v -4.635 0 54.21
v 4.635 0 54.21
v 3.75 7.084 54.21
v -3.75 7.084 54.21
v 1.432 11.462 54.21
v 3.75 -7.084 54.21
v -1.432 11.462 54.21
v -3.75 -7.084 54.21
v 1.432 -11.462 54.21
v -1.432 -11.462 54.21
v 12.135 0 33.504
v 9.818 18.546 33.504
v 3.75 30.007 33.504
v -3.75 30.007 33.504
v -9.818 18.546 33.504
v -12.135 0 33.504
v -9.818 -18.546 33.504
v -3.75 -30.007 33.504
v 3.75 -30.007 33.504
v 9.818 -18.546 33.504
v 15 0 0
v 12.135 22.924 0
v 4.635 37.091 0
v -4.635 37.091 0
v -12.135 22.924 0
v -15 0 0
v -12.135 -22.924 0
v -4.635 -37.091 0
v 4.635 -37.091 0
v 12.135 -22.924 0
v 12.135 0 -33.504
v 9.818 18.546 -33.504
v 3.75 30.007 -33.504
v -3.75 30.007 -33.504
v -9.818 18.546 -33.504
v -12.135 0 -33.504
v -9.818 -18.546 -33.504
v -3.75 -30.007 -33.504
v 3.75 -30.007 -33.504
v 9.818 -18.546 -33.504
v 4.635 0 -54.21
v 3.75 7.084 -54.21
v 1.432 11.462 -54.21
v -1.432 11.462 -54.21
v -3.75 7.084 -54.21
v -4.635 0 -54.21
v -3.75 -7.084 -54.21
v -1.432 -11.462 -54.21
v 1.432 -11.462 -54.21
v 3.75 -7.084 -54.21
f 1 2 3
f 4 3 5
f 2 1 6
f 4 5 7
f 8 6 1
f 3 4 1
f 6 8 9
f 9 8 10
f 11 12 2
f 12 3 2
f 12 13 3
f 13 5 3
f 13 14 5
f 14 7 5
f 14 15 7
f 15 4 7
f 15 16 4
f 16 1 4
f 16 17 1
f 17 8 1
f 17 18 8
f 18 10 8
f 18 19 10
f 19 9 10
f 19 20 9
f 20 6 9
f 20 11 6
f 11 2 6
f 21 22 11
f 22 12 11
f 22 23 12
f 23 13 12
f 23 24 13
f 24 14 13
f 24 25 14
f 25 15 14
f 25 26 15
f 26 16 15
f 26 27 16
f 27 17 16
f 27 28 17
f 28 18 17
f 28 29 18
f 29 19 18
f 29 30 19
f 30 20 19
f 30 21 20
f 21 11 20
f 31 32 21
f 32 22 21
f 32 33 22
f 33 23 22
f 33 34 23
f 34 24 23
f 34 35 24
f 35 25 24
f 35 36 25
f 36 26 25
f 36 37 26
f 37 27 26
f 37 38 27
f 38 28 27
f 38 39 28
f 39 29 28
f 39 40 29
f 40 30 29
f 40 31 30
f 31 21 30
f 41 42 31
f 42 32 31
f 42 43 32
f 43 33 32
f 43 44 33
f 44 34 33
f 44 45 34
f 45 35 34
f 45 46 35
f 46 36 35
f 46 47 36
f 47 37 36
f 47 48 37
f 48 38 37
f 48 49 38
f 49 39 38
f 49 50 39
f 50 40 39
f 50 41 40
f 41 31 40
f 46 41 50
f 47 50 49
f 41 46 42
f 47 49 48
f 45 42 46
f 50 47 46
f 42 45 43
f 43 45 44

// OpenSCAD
// Generated by SolidPython 1.0.1 on 2020-07-29 00:46:46


scale(v = [5, 13, 19]) {
	sphere(r = 3);
}
/***********************************************
*********      SolidPython code:      **********
************************************************
 
# import packages: SolidPython
from solid import *
from solid.utils import *
from itertools import chain, combinations, permutations


class Resize:

    def __init__(self, scad_file):
        self.scad_file = scad_file
        #self.scad_file = import_scad(scad_file)
        # cone/cylinder param:
        self.r1 = 0
        self.r2 = 0
        self.h = 0
        # rectangular prism param:
        self.w = 0
        self.l = 0
        # ellipse param:
        self.r = 0

    # import OpenScad code (file name corresponds to shape)


    # classify shape + parameters
    def assign(self, param1, param2, param3):
        if self.scad_file == 'cone.scad':
            self.r1 = param1
            self.r2 = param2
            self.h = param3
        elif self.scad_file == 'cylinder.scad':
            self.r1 = param1
            self.r2 = param2
            self.h = param3
        elif self.scad_file == 'rectangularPrism.scad':
            self.h = param1
            self.l = param2
            self.w = param3
        else:
            self.r = param1
            self.h = param2

    # resize parameters
    def iterate(self):
        x = range(3, 20, 2)
        i = 1
        if self.scad_file == 'cone.scad':
            tempList = list(permutations(x, 2))
            for temp in tempList:
                param1 = temp[0]
                param2 = temp[1]
                filepath = 'produced_scad_files/' + 'cone' + str(param1) + '_' + str(param2) + '_' + '.scad'
                scad_render_to_file(cylinder(h=param1, r1=param2, r2=0), filepath)

        elif self.scad_file == 'cylinder.scad':
            tempList = list(permutations(x, 3))
            for temp in tempList:
                param1 = temp[0]
                param2 = temp[1]
                filepath = 'produced_scad_files/' + 'cylinder' + str(param1) + '_' + str(param2) + '_' + '.scad'
                scad_render_to_file(cylinder(h=param1, r1=param2, r2=param2), filepath)

        elif self.scad_file == 'rectangularPrism.scad':
            tempList = list(permutations(x, 3))
            for temp in tempList:
                param1 = temp[0]
                param2 = temp[1]
                param3 = temp[2]
                filepath = 'produced_scad_files/' + 'rectangularPrism' + str(param1) + '_' + str(param2) + '_' + str(
                    param3) + '.scad'
                scad_render_to_file(cube(size=(param1, param2, param3)), filepath)

        elif self.scad_file == 'ellipse.scad':
            tempList = list(permutations(x, 4))
            for temp in tempList:
                param1 = temp[0]
                param2 = temp[1]
                param3 = temp[2]
                param4 = temp[3]
                filepath = 'produced_scad_files/' + 'ellipse' + str(param1) + '_' + str(param2) + '_' + str(param3) + '_' + str(param4) + '.scad'
                scad_render_to_file(scale([param1, param2, param3])(sphere(r=param4)), filepath)

    def render_to_scadfile(self):
        scad_render_to_file(scad, 'example.scad') 
 
************************************************/
